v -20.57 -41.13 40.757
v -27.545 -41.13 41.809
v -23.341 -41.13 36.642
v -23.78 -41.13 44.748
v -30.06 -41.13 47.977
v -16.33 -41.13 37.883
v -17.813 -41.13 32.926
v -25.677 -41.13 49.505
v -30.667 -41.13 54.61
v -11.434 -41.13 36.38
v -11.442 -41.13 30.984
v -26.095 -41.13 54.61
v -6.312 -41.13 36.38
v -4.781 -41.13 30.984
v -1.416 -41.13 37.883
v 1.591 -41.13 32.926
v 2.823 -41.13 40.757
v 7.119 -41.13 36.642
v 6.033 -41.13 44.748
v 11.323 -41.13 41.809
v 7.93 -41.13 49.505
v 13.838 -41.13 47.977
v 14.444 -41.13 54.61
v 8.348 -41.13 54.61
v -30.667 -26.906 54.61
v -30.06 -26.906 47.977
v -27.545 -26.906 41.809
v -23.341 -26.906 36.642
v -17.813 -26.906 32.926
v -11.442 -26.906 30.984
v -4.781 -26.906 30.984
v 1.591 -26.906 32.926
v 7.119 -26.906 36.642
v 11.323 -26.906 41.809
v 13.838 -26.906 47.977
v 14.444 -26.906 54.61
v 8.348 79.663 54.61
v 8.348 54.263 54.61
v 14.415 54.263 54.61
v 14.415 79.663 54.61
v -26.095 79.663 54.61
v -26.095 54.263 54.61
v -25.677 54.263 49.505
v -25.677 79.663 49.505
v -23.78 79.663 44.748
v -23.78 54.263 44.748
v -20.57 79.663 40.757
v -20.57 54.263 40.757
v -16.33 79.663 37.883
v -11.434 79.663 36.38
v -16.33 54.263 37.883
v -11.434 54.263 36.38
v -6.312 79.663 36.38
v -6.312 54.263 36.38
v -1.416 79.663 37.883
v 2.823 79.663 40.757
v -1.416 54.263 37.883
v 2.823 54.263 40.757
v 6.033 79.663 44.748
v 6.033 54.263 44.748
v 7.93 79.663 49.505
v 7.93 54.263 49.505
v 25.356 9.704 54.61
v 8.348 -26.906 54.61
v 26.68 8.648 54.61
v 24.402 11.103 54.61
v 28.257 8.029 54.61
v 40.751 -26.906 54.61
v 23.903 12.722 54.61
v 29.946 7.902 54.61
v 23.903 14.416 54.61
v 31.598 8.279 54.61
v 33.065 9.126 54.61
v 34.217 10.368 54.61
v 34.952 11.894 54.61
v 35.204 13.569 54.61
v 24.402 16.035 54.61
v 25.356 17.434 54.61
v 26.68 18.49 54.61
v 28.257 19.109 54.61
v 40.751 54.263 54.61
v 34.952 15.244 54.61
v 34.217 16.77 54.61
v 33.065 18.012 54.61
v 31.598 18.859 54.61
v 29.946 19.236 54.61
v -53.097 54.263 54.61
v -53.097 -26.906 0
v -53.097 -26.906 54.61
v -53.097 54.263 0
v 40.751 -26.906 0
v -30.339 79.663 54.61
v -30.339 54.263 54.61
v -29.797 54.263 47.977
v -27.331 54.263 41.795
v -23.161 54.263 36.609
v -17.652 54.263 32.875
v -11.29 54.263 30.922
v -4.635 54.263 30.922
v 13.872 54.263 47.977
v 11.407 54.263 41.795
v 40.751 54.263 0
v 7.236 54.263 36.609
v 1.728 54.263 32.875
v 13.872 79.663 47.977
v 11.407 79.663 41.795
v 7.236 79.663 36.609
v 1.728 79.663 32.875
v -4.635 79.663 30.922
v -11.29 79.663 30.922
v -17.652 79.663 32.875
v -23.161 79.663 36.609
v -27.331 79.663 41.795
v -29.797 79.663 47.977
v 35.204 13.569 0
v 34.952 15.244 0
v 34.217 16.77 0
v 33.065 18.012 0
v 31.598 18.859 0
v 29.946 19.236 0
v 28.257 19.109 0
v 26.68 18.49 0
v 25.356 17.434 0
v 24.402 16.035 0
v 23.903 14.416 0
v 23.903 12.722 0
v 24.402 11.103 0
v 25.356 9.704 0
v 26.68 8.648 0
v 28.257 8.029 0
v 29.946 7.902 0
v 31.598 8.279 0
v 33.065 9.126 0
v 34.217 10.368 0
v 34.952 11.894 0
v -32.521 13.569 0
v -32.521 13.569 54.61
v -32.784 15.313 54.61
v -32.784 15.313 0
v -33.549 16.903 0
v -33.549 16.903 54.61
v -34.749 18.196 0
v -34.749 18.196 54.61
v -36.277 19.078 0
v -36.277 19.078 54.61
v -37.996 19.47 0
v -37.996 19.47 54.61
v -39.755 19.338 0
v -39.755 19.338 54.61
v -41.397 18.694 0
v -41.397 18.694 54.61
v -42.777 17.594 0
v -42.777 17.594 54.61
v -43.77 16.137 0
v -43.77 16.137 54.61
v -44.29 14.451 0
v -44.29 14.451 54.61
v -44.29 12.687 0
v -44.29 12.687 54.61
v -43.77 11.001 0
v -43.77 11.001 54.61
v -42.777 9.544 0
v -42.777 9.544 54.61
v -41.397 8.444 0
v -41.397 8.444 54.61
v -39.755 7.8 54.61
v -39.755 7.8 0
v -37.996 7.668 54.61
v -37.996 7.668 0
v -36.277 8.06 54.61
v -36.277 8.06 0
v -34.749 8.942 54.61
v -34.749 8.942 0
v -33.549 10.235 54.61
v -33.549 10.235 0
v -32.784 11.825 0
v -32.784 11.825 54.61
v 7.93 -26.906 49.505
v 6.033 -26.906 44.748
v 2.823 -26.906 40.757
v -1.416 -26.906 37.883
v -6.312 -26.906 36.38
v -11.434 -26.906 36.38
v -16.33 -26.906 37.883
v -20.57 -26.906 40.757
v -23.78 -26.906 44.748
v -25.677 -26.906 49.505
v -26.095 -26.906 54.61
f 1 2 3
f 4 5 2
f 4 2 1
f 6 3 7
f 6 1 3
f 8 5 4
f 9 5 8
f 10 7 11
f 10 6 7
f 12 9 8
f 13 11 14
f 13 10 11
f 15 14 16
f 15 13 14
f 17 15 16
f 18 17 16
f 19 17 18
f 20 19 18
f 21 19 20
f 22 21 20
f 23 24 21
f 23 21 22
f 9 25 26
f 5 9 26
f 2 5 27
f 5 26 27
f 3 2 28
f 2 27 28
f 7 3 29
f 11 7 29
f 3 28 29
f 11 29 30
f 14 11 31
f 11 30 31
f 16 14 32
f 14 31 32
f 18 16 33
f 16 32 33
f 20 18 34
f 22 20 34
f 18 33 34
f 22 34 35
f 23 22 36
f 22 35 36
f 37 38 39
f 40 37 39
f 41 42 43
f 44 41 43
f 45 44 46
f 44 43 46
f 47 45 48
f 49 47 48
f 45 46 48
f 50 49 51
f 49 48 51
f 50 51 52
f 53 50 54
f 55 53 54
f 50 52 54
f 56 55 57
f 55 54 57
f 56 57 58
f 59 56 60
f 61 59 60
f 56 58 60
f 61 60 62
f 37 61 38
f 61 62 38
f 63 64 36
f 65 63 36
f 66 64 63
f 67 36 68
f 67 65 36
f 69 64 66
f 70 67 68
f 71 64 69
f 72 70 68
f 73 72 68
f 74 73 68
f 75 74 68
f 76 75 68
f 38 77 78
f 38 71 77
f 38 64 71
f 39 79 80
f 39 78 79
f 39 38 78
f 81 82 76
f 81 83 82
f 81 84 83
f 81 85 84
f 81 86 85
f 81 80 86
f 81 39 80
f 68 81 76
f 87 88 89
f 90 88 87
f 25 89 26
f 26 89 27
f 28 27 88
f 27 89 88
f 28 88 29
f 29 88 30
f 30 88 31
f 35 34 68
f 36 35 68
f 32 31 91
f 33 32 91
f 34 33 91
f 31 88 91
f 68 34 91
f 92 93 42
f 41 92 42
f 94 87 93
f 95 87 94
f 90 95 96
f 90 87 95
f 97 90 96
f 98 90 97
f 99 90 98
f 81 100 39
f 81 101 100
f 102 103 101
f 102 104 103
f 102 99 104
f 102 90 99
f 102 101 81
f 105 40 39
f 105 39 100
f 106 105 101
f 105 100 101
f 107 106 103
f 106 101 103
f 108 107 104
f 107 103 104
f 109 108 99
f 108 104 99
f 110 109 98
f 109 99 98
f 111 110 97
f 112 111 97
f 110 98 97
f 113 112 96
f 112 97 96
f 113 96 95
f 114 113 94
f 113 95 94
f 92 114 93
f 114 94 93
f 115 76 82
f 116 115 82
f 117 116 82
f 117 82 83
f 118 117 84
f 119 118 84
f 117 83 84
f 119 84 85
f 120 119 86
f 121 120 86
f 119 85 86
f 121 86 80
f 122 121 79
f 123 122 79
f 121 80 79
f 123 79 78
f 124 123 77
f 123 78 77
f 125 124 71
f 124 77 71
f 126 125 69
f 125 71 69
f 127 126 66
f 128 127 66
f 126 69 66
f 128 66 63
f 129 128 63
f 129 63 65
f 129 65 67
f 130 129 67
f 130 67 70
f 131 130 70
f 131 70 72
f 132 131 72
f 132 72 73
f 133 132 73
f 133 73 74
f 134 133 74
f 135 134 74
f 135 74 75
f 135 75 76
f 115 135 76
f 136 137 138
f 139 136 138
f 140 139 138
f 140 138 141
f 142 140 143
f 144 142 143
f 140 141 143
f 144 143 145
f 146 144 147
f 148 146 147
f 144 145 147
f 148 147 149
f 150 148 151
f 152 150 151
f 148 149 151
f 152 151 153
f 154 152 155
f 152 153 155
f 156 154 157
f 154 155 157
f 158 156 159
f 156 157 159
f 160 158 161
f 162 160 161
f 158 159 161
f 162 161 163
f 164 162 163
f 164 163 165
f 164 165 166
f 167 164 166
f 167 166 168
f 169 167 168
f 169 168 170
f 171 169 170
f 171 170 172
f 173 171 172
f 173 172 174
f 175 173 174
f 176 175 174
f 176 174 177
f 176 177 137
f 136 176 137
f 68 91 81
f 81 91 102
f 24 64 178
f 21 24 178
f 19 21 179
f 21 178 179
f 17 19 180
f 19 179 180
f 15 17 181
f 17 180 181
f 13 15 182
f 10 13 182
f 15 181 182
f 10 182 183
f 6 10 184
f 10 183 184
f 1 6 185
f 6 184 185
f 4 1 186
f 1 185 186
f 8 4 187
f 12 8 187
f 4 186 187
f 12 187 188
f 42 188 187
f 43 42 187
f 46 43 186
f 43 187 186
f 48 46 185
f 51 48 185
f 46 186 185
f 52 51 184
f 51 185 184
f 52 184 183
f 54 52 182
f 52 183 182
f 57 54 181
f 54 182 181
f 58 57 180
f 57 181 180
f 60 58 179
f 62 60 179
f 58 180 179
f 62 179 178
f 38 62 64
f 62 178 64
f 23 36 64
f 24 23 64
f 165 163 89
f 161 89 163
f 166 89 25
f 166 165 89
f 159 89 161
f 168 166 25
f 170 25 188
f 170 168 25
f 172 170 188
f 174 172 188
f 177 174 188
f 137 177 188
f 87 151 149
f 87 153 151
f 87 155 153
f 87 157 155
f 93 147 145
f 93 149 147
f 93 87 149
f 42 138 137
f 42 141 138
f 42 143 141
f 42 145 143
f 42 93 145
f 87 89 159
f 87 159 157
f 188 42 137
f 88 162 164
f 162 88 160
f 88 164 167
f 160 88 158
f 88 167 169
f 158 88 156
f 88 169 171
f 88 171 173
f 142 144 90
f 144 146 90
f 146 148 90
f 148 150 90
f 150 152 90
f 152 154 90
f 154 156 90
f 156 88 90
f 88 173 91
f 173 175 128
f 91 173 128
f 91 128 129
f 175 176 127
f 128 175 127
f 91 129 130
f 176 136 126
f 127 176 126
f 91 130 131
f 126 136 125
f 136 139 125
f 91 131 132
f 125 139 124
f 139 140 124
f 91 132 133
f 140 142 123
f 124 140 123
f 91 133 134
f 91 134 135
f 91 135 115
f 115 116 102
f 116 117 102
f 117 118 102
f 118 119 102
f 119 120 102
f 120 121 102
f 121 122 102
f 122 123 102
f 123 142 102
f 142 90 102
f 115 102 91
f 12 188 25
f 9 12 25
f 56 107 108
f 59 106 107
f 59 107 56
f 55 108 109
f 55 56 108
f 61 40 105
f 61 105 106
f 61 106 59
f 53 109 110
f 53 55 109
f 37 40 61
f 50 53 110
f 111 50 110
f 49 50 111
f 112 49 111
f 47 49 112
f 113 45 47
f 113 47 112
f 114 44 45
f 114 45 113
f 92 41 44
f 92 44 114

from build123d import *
from build123d import SkipClean  # not in build123d's __all__

# Parameters (mm, degrees)
F0_W     = 93.8486419618
F0_H     = 81.169269979
F1_DEPTH = 54.61
F3_DEPTH = 106.426
F4_DEPTH = 14.224
F6_DEPTH = 25.4
F7_R     = 5.6825549867
F7_R_2   = 5.9178586753
F8_DEPTH = 85.598


# Not quite as in the source:
# - after a boolean that leaves OpenCascade's solid faulty, fix() repairs it


with BuildPart() as f1:
    # F0 (on Top) → F1 (new body)
    with BuildSketch(Plane.XY):
        with Locations((-6.1729941517, 13.6784166098)):
            Rectangle(F0_W, F0_H)
    extrude(amount=F1_DEPTH)

    # F2 (on face) → F3 (cut)
    with BuildSketch(Plane.XZ.offset(26.9062183797)):
        with BuildLine():
            Line((8.3481688052, 54.61), (-26.0948427022, 54.61))
            ThreePointArc((-26.0948427022, 54.61), (-8.8733369485, 36.1893553029), (8.3481688052, 54.61))
        make_face()
    extrude(amount=-F3_DEPTH, mode=Mode.SUBTRACT)

    # F2 (on face) → F4 (join)
    with BuildSketch(Plane.XZ.offset(26.9062183797)):
        with BuildLine():
            Line((-26.0948427022, 54.61), (-30.6669250131, 54.61))
            ThreePointArc((-30.6669250131, 54.61), (-8.1113255583, 30.7368959369), (14.4442738965, 54.61))
            Line((14.4442738965, 54.61), (8.3481688052, 54.61))
            ThreePointArc((8.3481688052, 54.61), (-8.8733369485, 36.1893553029), (-26.0948427022, 54.61))
        make_face()
    with SkipClean():  # cleaning this boolean's faces spoils the solid; the shape is the same uncleaned
        extrude(amount=F4_DEPTH)

    # F5 (on face) → F6 (join)
    with BuildSketch(Plane(origin=(0, 54.2630515993, 0), x_dir=(-1, 0, 0), z_dir=(0, 1, 0))):
        with BuildLine():
            Line((-8.3481688052, 54.61), (-14.4147723913, 54.61))
            ThreePointArc((-14.4147723913, 54.61), (7.9621765763, 30.6739396567), (30.3391255438, 54.61))
            Line((30.3391255438, 54.61), (26.0948427022, 54.61))
            ThreePointArc((26.0948427022, 54.61), (8.8733369485, 36.1893553029), (-8.3481688052, 54.61))
        make_face()
    extrude(amount=F6_DEPTH)

    add(f1.part.fix(), mode=Mode.REPLACE)

    # F7 (on face) → F8 (cut)
    with BuildSketch(Plane.XY.offset(54.61)):
        with Locations((29.5217633247, 13.5689973831)):
            Circle(F7_R)
        with Locations((-38.4385436773, 13.5689973831)):
            Circle(F7_R_2)
    extrude(amount=-F8_DEPTH, mode=Mode.SUBTRACT)


solid = f1.part
